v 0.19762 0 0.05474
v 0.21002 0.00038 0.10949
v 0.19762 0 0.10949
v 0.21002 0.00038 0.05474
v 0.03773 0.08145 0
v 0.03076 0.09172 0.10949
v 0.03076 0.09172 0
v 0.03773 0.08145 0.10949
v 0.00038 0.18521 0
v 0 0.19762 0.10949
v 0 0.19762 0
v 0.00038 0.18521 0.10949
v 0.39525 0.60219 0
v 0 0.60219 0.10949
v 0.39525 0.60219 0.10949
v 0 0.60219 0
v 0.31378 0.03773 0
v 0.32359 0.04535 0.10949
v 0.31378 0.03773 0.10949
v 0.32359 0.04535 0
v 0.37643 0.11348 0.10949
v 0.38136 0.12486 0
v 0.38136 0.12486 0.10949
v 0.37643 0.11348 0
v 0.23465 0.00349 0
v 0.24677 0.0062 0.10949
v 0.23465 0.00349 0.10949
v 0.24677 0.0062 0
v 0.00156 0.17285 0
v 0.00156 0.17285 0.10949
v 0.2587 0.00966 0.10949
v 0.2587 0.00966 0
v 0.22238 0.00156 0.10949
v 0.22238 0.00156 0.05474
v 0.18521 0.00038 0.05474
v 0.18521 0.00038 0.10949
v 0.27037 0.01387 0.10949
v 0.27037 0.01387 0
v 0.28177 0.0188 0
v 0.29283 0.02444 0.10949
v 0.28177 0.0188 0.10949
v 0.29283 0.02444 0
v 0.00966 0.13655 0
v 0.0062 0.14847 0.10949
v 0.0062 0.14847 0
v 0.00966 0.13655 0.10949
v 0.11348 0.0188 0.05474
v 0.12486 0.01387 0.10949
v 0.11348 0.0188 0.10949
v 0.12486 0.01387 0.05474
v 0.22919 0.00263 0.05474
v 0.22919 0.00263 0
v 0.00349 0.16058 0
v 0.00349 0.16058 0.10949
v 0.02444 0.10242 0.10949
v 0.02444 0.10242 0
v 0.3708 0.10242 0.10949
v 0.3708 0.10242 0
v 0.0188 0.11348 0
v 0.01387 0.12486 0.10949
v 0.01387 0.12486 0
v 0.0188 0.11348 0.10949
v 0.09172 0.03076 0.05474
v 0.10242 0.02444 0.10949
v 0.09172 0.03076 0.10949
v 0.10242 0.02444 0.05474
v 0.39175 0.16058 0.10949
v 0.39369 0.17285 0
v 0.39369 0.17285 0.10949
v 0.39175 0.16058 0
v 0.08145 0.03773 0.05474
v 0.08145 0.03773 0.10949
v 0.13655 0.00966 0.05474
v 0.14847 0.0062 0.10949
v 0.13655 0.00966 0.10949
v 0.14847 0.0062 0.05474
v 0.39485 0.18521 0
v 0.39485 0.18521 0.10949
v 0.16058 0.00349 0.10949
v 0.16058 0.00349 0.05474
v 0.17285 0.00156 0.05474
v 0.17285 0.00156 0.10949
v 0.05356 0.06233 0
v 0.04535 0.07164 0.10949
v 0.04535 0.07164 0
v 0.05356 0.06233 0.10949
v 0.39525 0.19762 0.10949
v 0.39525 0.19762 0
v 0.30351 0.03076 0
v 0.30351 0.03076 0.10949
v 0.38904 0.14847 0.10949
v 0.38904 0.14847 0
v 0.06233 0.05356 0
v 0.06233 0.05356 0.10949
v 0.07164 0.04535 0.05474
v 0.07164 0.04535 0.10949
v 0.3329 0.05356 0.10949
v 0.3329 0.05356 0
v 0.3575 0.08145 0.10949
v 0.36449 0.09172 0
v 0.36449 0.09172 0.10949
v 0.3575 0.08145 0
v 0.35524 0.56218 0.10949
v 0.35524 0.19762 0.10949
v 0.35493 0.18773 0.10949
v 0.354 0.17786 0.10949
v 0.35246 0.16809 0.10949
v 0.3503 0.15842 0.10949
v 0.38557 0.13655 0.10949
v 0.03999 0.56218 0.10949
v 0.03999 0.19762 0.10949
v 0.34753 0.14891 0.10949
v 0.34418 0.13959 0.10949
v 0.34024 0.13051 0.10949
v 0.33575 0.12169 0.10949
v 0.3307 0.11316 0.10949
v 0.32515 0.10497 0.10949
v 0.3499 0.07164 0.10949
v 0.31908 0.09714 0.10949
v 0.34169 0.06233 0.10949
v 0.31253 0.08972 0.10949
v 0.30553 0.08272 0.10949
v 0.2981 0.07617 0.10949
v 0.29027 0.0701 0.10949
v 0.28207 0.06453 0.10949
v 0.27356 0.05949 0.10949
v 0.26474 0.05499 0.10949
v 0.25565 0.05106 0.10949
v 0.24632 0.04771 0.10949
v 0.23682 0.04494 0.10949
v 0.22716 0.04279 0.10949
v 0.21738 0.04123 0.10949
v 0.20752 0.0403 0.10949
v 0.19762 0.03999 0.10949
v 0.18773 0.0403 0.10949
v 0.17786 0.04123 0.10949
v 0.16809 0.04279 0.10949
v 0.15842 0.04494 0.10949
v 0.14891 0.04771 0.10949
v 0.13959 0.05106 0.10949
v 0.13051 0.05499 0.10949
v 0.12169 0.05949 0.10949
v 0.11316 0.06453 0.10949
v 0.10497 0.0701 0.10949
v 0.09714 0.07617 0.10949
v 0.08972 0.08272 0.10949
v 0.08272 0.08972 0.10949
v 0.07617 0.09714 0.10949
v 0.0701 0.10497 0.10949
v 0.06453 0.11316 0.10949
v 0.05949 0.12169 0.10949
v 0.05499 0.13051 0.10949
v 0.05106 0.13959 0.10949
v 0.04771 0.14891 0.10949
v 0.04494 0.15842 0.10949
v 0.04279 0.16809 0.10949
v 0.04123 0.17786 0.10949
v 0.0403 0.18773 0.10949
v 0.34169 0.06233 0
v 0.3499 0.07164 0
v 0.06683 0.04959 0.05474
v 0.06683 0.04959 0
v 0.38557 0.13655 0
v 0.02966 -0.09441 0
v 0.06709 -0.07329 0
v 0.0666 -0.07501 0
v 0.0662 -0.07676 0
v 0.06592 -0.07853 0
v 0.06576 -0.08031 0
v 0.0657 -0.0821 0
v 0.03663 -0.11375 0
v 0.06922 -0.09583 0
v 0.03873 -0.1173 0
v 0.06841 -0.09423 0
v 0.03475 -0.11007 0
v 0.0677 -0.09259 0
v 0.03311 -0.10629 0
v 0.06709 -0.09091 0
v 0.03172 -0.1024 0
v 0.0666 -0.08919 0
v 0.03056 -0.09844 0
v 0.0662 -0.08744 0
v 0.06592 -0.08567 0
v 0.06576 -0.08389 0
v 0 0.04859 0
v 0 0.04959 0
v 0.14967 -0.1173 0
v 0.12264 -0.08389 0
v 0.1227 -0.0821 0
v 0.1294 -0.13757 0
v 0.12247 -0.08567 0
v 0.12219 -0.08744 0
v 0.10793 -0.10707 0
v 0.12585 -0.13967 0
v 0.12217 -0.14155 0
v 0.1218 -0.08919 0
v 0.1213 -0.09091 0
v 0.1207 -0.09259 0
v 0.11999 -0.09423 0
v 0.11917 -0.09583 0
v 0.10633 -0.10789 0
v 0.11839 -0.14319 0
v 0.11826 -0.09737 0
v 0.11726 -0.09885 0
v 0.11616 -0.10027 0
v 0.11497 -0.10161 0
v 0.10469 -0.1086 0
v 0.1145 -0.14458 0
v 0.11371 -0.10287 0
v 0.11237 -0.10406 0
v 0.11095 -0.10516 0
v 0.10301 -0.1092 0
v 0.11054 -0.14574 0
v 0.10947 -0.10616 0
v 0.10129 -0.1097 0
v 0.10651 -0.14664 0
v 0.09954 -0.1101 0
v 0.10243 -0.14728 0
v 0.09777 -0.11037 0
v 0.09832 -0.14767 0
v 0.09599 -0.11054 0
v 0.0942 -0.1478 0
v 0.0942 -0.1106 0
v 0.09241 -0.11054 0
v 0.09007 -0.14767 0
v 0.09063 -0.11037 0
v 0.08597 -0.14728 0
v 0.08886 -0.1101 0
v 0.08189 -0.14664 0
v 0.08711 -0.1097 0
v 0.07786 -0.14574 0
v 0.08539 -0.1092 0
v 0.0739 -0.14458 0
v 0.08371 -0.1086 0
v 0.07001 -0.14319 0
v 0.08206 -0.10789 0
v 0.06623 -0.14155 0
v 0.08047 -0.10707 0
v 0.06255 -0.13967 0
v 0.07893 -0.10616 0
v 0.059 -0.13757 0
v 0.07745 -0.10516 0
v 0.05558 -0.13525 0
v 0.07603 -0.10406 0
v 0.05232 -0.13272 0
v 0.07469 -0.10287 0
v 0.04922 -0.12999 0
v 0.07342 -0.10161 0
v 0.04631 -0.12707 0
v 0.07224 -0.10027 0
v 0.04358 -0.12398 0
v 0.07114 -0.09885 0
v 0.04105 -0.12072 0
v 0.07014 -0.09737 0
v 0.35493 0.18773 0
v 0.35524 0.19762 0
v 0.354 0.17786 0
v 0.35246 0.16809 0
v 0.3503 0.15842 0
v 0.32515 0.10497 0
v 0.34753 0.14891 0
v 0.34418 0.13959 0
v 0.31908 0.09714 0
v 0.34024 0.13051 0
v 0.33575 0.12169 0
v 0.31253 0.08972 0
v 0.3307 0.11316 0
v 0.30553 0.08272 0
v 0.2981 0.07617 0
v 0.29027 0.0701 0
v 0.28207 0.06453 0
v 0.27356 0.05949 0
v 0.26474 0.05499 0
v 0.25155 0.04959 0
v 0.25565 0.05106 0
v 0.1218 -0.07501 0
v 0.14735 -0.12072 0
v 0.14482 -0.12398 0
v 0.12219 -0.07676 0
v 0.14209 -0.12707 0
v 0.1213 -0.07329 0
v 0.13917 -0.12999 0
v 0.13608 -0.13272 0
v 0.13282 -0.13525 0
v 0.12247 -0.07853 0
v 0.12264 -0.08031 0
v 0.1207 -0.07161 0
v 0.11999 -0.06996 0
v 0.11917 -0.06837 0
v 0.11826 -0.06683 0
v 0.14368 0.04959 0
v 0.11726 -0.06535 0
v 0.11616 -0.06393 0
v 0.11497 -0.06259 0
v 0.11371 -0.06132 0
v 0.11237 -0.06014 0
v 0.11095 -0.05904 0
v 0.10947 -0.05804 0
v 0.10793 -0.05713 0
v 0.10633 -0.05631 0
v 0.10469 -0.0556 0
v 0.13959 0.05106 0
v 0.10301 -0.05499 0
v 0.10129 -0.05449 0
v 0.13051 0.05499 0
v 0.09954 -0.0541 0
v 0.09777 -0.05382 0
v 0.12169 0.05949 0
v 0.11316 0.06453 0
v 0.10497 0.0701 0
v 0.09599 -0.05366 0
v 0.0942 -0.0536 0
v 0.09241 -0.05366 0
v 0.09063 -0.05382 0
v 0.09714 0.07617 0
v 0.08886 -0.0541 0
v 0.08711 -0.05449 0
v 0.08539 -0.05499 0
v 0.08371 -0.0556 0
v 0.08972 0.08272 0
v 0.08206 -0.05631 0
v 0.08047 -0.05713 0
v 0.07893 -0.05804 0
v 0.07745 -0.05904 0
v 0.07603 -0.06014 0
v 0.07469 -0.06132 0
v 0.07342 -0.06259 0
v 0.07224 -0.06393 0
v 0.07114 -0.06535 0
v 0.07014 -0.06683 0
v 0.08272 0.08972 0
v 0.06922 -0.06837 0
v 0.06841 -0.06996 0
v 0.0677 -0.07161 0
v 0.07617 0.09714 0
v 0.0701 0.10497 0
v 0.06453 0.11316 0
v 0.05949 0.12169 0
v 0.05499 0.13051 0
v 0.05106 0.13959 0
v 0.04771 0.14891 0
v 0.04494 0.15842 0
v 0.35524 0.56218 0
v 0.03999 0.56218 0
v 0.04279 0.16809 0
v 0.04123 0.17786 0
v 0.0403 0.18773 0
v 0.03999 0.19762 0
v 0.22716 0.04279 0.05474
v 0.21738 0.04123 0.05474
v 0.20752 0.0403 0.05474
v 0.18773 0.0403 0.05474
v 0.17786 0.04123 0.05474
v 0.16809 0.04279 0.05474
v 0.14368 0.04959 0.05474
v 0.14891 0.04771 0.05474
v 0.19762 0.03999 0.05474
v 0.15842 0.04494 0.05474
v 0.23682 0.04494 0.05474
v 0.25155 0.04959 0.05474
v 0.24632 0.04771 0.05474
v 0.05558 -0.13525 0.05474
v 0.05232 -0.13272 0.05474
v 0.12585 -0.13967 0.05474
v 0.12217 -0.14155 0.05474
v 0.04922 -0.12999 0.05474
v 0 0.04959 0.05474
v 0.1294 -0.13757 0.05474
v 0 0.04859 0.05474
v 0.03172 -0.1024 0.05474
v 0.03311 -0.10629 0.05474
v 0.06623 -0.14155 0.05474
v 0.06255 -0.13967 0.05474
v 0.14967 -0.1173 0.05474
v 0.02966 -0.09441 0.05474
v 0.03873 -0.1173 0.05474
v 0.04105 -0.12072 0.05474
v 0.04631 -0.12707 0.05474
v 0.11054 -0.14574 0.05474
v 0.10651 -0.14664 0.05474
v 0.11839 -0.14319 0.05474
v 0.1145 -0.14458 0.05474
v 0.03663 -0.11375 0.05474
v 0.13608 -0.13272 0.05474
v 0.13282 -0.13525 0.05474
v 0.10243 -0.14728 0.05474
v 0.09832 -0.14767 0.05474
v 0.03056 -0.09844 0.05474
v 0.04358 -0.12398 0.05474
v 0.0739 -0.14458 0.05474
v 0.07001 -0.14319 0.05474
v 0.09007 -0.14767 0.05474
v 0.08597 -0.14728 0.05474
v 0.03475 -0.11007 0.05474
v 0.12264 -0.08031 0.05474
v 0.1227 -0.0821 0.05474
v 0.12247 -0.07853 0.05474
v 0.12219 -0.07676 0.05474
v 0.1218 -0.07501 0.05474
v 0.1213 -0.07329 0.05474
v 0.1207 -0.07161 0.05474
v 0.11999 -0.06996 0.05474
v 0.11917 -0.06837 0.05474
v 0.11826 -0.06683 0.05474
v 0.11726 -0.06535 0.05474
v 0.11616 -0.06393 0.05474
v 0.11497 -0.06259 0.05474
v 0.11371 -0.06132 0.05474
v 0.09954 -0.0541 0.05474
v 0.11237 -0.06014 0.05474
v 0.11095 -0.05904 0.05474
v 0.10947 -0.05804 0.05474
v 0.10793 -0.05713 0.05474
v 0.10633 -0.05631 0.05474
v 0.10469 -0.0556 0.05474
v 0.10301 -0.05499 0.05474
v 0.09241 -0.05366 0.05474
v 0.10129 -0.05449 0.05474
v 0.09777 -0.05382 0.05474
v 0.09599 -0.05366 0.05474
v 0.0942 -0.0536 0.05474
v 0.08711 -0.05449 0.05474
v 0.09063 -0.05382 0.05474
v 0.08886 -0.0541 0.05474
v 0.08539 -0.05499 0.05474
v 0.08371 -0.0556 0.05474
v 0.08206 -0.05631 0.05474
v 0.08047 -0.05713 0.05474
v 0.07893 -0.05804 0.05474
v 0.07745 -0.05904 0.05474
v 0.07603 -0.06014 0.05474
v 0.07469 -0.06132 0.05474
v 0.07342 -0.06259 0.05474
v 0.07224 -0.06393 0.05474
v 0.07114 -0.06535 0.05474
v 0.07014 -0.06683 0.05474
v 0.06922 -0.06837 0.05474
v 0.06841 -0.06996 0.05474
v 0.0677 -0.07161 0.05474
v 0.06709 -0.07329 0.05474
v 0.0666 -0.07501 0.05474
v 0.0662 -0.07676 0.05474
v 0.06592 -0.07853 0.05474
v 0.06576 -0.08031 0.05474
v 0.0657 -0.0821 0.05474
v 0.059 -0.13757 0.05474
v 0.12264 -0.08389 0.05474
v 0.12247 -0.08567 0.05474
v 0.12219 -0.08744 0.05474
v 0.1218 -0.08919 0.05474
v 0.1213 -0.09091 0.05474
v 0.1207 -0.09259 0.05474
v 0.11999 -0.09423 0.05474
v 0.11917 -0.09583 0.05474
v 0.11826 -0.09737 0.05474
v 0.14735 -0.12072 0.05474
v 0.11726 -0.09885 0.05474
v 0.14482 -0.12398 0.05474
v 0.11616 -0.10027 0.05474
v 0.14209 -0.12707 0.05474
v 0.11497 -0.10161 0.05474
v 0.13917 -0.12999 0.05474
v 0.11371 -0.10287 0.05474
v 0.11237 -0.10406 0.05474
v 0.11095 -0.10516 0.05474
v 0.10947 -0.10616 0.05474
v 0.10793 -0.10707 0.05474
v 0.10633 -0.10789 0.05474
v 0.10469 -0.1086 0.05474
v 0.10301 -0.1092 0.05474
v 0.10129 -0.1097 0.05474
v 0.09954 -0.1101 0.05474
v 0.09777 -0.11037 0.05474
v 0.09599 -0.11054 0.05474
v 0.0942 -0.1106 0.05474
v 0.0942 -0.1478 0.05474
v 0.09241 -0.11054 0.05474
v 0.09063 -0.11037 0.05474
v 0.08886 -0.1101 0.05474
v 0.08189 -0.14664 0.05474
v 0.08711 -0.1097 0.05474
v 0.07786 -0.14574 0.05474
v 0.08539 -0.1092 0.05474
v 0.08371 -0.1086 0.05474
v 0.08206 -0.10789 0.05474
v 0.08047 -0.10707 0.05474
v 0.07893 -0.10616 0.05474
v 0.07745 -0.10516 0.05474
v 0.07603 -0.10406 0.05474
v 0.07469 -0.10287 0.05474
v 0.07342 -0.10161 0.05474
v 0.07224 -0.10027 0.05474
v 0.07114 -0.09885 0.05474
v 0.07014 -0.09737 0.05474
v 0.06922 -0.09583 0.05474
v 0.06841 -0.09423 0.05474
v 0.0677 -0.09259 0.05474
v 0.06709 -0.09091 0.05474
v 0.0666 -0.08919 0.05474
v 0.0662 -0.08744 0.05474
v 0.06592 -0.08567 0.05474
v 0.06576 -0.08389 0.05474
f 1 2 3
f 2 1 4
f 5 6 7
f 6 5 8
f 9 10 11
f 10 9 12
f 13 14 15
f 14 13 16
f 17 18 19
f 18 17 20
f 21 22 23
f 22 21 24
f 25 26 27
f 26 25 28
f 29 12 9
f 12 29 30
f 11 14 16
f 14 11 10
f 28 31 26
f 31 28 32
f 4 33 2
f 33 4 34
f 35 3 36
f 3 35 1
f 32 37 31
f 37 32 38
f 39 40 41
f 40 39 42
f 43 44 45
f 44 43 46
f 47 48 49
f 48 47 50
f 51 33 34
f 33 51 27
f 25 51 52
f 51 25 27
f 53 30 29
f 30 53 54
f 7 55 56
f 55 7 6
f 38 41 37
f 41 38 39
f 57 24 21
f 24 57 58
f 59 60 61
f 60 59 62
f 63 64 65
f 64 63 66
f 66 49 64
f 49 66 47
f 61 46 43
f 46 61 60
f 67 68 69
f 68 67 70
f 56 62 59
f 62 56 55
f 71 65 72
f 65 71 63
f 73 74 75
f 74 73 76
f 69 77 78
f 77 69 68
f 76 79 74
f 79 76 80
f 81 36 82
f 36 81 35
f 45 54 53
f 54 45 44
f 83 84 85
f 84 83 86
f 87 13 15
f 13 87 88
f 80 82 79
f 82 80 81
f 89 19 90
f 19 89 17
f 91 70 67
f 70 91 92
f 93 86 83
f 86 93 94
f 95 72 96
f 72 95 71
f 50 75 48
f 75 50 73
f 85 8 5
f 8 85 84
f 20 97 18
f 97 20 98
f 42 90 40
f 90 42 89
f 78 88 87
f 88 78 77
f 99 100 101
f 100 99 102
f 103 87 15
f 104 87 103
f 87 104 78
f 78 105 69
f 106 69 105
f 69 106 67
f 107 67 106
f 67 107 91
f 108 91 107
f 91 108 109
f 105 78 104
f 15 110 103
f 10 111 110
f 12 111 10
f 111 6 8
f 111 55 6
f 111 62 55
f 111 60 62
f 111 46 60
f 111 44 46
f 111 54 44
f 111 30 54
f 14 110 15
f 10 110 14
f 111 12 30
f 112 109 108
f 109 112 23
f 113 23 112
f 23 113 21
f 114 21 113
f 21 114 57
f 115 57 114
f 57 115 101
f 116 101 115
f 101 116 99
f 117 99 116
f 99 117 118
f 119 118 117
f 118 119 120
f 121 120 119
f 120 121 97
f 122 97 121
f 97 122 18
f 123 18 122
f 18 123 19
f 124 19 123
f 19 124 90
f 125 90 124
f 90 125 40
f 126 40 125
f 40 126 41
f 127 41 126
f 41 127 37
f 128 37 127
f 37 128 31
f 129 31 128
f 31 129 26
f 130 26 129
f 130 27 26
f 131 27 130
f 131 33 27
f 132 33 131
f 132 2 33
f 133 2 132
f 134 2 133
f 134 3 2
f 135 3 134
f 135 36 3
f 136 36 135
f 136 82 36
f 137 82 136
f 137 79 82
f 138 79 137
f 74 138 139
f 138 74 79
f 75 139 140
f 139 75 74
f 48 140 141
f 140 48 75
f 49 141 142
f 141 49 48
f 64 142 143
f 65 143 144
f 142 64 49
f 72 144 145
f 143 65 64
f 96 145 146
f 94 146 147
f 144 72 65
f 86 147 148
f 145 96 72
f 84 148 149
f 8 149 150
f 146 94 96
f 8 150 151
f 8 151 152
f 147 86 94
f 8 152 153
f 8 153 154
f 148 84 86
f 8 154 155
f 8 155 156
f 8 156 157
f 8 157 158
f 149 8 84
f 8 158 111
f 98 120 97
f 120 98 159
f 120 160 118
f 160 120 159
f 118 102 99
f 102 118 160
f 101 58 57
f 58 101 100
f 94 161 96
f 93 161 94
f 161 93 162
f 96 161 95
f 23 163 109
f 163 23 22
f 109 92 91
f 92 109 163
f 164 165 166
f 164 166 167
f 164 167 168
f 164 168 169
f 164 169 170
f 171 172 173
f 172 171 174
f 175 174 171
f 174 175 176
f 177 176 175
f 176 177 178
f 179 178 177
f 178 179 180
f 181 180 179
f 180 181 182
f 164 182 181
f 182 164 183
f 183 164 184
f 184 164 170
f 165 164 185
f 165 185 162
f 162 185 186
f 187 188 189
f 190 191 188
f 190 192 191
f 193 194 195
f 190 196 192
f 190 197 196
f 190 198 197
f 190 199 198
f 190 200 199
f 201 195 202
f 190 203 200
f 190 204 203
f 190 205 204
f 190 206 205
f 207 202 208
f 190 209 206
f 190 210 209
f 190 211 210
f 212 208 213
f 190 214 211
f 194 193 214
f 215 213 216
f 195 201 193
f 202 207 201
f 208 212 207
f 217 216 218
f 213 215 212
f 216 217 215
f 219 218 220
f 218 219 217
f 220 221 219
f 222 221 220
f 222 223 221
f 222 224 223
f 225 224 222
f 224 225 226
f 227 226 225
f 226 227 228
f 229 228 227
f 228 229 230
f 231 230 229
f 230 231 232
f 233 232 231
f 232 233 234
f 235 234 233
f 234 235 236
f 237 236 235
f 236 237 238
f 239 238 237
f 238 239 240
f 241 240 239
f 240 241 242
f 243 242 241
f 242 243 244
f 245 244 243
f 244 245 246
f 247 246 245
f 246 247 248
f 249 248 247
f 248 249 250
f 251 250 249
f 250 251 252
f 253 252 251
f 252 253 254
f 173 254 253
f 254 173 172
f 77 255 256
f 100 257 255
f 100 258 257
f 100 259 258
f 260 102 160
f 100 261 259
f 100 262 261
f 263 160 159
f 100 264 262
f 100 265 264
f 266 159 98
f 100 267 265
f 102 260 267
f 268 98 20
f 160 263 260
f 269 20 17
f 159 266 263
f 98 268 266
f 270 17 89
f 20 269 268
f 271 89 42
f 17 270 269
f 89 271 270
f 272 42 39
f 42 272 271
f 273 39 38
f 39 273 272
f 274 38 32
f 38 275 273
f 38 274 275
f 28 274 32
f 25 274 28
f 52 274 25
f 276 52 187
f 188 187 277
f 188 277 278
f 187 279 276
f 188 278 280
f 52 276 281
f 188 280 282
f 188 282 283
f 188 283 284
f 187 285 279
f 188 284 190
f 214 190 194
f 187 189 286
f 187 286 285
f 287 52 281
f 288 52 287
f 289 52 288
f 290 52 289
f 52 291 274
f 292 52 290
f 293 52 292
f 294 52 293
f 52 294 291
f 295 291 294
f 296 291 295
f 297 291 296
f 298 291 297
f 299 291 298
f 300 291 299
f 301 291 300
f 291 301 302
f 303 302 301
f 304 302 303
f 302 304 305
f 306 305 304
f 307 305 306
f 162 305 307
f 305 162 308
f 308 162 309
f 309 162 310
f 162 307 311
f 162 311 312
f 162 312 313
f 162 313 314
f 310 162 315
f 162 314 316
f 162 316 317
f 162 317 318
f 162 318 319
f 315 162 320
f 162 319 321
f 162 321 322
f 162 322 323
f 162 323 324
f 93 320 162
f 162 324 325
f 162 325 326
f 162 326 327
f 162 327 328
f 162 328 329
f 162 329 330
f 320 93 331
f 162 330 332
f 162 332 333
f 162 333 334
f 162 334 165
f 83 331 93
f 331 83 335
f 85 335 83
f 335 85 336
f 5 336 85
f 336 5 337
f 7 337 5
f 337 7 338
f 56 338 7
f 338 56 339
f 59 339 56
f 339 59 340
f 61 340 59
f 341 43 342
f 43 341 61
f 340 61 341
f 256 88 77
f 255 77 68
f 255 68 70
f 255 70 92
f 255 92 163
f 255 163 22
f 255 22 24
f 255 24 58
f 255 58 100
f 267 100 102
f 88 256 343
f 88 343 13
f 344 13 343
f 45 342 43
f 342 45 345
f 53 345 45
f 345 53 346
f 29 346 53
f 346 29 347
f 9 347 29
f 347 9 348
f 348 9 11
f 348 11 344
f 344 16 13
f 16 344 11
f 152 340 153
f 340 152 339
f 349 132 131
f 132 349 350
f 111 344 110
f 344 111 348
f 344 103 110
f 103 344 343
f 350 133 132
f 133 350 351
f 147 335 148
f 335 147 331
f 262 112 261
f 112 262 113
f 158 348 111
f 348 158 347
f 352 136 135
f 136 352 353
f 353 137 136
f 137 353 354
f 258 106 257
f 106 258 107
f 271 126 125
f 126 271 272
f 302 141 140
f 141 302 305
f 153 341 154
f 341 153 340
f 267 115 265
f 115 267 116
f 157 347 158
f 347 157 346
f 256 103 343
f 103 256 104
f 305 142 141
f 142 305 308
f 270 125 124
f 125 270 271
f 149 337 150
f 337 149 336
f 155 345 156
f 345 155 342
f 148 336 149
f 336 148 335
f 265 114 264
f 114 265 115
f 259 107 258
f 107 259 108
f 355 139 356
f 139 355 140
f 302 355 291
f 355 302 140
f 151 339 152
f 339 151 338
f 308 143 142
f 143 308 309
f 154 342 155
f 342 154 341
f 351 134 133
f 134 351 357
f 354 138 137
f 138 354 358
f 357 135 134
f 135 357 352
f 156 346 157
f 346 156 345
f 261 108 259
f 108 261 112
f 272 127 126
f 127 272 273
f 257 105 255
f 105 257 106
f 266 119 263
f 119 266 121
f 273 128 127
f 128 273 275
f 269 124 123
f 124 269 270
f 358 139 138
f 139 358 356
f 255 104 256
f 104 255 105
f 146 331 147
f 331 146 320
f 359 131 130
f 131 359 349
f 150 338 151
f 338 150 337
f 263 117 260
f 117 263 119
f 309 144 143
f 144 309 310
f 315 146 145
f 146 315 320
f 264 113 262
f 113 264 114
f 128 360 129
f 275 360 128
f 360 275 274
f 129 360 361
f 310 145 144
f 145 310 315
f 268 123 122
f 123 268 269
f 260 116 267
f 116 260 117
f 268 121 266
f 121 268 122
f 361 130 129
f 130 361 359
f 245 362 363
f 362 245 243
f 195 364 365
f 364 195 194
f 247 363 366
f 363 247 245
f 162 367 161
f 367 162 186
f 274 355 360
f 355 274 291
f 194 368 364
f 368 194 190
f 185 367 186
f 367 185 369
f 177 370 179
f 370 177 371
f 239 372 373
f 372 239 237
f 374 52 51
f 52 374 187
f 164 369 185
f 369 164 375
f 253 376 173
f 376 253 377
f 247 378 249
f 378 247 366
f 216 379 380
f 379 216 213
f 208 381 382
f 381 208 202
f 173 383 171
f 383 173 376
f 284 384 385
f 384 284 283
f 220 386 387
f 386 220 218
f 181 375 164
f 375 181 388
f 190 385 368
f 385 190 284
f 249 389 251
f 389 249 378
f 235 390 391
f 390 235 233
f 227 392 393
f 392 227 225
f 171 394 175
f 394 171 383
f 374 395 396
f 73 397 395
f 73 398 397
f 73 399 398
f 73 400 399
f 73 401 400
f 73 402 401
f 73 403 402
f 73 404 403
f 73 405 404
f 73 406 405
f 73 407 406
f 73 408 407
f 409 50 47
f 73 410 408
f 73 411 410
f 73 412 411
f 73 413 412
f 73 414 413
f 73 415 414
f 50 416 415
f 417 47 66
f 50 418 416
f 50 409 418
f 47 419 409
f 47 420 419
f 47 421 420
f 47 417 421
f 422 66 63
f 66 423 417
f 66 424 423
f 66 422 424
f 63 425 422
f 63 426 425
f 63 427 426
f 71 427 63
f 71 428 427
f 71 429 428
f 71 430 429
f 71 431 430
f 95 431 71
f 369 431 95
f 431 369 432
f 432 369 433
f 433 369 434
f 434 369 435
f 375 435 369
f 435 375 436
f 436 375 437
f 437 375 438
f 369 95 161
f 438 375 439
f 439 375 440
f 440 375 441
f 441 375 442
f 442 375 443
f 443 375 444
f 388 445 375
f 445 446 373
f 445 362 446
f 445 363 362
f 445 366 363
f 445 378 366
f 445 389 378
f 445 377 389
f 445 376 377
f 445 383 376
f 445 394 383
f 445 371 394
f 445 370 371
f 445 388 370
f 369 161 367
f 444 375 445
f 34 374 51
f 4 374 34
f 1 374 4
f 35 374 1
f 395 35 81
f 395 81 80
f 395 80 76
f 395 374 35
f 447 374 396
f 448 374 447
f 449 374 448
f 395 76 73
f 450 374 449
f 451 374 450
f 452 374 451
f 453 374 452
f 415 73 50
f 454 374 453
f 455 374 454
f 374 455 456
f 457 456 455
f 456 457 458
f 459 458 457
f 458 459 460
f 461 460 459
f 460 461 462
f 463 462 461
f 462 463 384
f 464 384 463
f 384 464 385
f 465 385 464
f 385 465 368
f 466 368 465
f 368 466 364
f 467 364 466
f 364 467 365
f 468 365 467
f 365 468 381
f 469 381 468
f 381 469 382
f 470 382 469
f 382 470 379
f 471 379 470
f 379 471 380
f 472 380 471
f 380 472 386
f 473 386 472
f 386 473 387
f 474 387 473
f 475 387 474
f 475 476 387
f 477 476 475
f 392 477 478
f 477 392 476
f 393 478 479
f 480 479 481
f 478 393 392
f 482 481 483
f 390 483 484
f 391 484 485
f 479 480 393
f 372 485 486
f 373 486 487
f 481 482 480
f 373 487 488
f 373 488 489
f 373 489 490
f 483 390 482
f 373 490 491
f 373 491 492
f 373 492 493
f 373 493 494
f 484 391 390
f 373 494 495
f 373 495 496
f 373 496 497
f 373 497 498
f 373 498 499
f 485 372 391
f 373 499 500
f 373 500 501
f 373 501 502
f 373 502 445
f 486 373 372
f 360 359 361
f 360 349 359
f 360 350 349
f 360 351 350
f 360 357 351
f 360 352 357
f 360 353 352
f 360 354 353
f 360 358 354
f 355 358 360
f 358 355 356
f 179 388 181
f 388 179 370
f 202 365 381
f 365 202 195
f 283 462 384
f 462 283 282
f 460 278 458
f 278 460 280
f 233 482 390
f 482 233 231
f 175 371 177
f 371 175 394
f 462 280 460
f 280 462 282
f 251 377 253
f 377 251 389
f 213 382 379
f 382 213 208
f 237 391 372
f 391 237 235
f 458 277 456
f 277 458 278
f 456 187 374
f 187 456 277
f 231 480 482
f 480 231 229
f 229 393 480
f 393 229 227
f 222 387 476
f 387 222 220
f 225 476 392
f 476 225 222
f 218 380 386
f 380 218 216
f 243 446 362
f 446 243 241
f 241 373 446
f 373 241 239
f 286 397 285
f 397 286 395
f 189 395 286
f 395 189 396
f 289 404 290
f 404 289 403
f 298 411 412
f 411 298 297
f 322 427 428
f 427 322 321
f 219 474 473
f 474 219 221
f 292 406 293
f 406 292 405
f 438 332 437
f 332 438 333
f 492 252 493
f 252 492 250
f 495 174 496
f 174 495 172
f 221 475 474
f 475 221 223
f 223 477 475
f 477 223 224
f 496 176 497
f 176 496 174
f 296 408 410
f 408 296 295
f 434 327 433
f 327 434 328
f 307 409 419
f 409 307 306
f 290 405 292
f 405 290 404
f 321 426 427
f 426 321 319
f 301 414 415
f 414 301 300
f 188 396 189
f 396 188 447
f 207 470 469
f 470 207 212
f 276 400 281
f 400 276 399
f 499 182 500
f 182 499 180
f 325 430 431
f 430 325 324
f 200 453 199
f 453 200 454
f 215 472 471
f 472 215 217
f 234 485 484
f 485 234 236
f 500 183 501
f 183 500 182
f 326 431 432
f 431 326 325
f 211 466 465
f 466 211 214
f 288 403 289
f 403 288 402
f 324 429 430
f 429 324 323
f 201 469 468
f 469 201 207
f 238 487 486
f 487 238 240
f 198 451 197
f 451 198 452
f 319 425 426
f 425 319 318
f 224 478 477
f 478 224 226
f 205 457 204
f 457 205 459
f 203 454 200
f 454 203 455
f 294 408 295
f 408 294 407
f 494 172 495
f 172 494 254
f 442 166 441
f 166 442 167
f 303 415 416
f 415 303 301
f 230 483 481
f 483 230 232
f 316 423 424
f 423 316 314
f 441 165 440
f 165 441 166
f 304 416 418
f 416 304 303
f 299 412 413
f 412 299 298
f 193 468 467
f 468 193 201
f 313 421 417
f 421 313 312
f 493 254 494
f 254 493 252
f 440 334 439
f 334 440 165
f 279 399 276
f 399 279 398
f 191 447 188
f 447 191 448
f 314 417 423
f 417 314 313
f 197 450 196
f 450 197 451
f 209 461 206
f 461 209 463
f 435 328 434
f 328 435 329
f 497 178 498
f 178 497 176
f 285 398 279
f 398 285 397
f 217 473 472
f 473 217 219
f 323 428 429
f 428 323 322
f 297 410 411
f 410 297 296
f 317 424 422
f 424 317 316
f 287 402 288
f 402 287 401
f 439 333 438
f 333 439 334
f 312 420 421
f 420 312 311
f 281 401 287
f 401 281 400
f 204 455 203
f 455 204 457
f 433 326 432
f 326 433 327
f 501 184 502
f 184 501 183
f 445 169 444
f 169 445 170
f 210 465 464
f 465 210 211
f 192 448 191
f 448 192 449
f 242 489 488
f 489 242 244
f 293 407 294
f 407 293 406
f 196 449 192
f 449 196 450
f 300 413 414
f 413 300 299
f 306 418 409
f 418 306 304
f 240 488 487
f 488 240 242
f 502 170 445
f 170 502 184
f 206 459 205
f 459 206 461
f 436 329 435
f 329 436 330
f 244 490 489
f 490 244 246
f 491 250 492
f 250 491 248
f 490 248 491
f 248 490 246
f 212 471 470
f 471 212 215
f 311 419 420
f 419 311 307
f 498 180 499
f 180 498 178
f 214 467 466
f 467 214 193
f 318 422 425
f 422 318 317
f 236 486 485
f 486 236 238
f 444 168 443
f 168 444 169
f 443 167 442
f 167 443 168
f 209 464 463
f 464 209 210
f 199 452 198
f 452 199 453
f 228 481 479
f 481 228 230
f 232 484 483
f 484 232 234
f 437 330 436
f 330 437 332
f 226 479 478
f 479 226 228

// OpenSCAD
// ==========================================
// Parametric Variables
// ==========================================

// Global resolution
$fn = 100;

// Main Base Dimensions (D-shaped frame)
base_length = 0.395255;  // X dimension footprint
base_width  = 0.60219;   // Y dimension footprint
base_height = 0.109489;  // Main extrusion depth
wall_thick  = 0.04;      // Assumed uniform wall thickness for the frame

// Protrusion Dimensions (Added solid round tab)
prot_height = 0.054745;
prot_axis_x = 0.0942;    // Left-offset of the shared axis
prot_axis_y = -0.0821;   // Front-offset of the shared axis
prot_outer_r = 0.0657;   // Radius of the solid round portion
prot_inner_r = 0.0285;   // Radius of the concentric cut

// Protrusion Bounding Box (Derived from edge offsets relative to main base)
// Left offset: 0 -> X_min = 0
// Right offset: 0.1356 -> X_max = base_length - 0.1356 = 0.259655
// Front offset: -0.1478 -> Y_min = -0.1478
// Back offset: 0.5526 -> Y_max = base_width - 0.5526 = 0.04959
prot_bb_length = 0.259658; 
prot_bb_y_max  = base_width - 0.5526; 

// ==========================================
// Modules
// ==========================================

// Module for the main D-shaped frame
module main_frame() {
    // The rounded arc wall is at the front (Y=0)
    arc_radius = base_length / 2;
    arc_center_y = arc_radius; // Center of the front arc to keep it flush with Y=0
    
    difference() {
        // Outer D-shape profile
        linear_extrude(base_height) {
            union() {
                // Straight rear and side portions
                translate([0, arc_center_y])
                    square([base_length, base_width - arc_center_y]);
                // Rounded arc wall at the front
                translate([arc_radius, arc_center_y])
                    circle(r=arc_radius);
            }
        }
        
        // Inner continuous through-opening
        translate([0, 0, -0.01])
        linear_extrude(base_height + 0.02) {
            union() {
                translate([wall_thick, arc_center_y])
                    square([base_length - 2*wall_thick, base_width - arc_center_y - wall_thick]);
                translate([arc_radius, arc_center_y])
                    circle(r=arc_radius - wall_thick);
            }
        }
    }
}

// Module for the shallower solid round protrusion
module protrusion() {
    // Formed by hulling the circular profile to a thin bounding strip 
    // to accurately match the specified rectangular footprint and edge offsets.
    linear_extrude(prot_height) {
        hull() {
            // Main round tab circular profile
            translate([prot_axis_x, prot_axis_y])
                circle(r=prot_outer_r);
            
            // Thin strip representing the attachment area footprint boundary
            translate([0, prot_bb_y_max - 0.001])
                square([prot_bb_length, 0.001]);
        }
    }
}

// ==========================================
// Main Assembly
// ==========================================

difference() {
    // Combine the main frame and the added protrusion
    union() {
        main_frame();
        protrusion();
    }
    
    // Cut the concentric circular opening through the shallow band
    translate([prot_axis_x, prot_axis_y, -0.01])
        cylinder(h=prot_height + 0.02, r=prot_inner_r);
}
